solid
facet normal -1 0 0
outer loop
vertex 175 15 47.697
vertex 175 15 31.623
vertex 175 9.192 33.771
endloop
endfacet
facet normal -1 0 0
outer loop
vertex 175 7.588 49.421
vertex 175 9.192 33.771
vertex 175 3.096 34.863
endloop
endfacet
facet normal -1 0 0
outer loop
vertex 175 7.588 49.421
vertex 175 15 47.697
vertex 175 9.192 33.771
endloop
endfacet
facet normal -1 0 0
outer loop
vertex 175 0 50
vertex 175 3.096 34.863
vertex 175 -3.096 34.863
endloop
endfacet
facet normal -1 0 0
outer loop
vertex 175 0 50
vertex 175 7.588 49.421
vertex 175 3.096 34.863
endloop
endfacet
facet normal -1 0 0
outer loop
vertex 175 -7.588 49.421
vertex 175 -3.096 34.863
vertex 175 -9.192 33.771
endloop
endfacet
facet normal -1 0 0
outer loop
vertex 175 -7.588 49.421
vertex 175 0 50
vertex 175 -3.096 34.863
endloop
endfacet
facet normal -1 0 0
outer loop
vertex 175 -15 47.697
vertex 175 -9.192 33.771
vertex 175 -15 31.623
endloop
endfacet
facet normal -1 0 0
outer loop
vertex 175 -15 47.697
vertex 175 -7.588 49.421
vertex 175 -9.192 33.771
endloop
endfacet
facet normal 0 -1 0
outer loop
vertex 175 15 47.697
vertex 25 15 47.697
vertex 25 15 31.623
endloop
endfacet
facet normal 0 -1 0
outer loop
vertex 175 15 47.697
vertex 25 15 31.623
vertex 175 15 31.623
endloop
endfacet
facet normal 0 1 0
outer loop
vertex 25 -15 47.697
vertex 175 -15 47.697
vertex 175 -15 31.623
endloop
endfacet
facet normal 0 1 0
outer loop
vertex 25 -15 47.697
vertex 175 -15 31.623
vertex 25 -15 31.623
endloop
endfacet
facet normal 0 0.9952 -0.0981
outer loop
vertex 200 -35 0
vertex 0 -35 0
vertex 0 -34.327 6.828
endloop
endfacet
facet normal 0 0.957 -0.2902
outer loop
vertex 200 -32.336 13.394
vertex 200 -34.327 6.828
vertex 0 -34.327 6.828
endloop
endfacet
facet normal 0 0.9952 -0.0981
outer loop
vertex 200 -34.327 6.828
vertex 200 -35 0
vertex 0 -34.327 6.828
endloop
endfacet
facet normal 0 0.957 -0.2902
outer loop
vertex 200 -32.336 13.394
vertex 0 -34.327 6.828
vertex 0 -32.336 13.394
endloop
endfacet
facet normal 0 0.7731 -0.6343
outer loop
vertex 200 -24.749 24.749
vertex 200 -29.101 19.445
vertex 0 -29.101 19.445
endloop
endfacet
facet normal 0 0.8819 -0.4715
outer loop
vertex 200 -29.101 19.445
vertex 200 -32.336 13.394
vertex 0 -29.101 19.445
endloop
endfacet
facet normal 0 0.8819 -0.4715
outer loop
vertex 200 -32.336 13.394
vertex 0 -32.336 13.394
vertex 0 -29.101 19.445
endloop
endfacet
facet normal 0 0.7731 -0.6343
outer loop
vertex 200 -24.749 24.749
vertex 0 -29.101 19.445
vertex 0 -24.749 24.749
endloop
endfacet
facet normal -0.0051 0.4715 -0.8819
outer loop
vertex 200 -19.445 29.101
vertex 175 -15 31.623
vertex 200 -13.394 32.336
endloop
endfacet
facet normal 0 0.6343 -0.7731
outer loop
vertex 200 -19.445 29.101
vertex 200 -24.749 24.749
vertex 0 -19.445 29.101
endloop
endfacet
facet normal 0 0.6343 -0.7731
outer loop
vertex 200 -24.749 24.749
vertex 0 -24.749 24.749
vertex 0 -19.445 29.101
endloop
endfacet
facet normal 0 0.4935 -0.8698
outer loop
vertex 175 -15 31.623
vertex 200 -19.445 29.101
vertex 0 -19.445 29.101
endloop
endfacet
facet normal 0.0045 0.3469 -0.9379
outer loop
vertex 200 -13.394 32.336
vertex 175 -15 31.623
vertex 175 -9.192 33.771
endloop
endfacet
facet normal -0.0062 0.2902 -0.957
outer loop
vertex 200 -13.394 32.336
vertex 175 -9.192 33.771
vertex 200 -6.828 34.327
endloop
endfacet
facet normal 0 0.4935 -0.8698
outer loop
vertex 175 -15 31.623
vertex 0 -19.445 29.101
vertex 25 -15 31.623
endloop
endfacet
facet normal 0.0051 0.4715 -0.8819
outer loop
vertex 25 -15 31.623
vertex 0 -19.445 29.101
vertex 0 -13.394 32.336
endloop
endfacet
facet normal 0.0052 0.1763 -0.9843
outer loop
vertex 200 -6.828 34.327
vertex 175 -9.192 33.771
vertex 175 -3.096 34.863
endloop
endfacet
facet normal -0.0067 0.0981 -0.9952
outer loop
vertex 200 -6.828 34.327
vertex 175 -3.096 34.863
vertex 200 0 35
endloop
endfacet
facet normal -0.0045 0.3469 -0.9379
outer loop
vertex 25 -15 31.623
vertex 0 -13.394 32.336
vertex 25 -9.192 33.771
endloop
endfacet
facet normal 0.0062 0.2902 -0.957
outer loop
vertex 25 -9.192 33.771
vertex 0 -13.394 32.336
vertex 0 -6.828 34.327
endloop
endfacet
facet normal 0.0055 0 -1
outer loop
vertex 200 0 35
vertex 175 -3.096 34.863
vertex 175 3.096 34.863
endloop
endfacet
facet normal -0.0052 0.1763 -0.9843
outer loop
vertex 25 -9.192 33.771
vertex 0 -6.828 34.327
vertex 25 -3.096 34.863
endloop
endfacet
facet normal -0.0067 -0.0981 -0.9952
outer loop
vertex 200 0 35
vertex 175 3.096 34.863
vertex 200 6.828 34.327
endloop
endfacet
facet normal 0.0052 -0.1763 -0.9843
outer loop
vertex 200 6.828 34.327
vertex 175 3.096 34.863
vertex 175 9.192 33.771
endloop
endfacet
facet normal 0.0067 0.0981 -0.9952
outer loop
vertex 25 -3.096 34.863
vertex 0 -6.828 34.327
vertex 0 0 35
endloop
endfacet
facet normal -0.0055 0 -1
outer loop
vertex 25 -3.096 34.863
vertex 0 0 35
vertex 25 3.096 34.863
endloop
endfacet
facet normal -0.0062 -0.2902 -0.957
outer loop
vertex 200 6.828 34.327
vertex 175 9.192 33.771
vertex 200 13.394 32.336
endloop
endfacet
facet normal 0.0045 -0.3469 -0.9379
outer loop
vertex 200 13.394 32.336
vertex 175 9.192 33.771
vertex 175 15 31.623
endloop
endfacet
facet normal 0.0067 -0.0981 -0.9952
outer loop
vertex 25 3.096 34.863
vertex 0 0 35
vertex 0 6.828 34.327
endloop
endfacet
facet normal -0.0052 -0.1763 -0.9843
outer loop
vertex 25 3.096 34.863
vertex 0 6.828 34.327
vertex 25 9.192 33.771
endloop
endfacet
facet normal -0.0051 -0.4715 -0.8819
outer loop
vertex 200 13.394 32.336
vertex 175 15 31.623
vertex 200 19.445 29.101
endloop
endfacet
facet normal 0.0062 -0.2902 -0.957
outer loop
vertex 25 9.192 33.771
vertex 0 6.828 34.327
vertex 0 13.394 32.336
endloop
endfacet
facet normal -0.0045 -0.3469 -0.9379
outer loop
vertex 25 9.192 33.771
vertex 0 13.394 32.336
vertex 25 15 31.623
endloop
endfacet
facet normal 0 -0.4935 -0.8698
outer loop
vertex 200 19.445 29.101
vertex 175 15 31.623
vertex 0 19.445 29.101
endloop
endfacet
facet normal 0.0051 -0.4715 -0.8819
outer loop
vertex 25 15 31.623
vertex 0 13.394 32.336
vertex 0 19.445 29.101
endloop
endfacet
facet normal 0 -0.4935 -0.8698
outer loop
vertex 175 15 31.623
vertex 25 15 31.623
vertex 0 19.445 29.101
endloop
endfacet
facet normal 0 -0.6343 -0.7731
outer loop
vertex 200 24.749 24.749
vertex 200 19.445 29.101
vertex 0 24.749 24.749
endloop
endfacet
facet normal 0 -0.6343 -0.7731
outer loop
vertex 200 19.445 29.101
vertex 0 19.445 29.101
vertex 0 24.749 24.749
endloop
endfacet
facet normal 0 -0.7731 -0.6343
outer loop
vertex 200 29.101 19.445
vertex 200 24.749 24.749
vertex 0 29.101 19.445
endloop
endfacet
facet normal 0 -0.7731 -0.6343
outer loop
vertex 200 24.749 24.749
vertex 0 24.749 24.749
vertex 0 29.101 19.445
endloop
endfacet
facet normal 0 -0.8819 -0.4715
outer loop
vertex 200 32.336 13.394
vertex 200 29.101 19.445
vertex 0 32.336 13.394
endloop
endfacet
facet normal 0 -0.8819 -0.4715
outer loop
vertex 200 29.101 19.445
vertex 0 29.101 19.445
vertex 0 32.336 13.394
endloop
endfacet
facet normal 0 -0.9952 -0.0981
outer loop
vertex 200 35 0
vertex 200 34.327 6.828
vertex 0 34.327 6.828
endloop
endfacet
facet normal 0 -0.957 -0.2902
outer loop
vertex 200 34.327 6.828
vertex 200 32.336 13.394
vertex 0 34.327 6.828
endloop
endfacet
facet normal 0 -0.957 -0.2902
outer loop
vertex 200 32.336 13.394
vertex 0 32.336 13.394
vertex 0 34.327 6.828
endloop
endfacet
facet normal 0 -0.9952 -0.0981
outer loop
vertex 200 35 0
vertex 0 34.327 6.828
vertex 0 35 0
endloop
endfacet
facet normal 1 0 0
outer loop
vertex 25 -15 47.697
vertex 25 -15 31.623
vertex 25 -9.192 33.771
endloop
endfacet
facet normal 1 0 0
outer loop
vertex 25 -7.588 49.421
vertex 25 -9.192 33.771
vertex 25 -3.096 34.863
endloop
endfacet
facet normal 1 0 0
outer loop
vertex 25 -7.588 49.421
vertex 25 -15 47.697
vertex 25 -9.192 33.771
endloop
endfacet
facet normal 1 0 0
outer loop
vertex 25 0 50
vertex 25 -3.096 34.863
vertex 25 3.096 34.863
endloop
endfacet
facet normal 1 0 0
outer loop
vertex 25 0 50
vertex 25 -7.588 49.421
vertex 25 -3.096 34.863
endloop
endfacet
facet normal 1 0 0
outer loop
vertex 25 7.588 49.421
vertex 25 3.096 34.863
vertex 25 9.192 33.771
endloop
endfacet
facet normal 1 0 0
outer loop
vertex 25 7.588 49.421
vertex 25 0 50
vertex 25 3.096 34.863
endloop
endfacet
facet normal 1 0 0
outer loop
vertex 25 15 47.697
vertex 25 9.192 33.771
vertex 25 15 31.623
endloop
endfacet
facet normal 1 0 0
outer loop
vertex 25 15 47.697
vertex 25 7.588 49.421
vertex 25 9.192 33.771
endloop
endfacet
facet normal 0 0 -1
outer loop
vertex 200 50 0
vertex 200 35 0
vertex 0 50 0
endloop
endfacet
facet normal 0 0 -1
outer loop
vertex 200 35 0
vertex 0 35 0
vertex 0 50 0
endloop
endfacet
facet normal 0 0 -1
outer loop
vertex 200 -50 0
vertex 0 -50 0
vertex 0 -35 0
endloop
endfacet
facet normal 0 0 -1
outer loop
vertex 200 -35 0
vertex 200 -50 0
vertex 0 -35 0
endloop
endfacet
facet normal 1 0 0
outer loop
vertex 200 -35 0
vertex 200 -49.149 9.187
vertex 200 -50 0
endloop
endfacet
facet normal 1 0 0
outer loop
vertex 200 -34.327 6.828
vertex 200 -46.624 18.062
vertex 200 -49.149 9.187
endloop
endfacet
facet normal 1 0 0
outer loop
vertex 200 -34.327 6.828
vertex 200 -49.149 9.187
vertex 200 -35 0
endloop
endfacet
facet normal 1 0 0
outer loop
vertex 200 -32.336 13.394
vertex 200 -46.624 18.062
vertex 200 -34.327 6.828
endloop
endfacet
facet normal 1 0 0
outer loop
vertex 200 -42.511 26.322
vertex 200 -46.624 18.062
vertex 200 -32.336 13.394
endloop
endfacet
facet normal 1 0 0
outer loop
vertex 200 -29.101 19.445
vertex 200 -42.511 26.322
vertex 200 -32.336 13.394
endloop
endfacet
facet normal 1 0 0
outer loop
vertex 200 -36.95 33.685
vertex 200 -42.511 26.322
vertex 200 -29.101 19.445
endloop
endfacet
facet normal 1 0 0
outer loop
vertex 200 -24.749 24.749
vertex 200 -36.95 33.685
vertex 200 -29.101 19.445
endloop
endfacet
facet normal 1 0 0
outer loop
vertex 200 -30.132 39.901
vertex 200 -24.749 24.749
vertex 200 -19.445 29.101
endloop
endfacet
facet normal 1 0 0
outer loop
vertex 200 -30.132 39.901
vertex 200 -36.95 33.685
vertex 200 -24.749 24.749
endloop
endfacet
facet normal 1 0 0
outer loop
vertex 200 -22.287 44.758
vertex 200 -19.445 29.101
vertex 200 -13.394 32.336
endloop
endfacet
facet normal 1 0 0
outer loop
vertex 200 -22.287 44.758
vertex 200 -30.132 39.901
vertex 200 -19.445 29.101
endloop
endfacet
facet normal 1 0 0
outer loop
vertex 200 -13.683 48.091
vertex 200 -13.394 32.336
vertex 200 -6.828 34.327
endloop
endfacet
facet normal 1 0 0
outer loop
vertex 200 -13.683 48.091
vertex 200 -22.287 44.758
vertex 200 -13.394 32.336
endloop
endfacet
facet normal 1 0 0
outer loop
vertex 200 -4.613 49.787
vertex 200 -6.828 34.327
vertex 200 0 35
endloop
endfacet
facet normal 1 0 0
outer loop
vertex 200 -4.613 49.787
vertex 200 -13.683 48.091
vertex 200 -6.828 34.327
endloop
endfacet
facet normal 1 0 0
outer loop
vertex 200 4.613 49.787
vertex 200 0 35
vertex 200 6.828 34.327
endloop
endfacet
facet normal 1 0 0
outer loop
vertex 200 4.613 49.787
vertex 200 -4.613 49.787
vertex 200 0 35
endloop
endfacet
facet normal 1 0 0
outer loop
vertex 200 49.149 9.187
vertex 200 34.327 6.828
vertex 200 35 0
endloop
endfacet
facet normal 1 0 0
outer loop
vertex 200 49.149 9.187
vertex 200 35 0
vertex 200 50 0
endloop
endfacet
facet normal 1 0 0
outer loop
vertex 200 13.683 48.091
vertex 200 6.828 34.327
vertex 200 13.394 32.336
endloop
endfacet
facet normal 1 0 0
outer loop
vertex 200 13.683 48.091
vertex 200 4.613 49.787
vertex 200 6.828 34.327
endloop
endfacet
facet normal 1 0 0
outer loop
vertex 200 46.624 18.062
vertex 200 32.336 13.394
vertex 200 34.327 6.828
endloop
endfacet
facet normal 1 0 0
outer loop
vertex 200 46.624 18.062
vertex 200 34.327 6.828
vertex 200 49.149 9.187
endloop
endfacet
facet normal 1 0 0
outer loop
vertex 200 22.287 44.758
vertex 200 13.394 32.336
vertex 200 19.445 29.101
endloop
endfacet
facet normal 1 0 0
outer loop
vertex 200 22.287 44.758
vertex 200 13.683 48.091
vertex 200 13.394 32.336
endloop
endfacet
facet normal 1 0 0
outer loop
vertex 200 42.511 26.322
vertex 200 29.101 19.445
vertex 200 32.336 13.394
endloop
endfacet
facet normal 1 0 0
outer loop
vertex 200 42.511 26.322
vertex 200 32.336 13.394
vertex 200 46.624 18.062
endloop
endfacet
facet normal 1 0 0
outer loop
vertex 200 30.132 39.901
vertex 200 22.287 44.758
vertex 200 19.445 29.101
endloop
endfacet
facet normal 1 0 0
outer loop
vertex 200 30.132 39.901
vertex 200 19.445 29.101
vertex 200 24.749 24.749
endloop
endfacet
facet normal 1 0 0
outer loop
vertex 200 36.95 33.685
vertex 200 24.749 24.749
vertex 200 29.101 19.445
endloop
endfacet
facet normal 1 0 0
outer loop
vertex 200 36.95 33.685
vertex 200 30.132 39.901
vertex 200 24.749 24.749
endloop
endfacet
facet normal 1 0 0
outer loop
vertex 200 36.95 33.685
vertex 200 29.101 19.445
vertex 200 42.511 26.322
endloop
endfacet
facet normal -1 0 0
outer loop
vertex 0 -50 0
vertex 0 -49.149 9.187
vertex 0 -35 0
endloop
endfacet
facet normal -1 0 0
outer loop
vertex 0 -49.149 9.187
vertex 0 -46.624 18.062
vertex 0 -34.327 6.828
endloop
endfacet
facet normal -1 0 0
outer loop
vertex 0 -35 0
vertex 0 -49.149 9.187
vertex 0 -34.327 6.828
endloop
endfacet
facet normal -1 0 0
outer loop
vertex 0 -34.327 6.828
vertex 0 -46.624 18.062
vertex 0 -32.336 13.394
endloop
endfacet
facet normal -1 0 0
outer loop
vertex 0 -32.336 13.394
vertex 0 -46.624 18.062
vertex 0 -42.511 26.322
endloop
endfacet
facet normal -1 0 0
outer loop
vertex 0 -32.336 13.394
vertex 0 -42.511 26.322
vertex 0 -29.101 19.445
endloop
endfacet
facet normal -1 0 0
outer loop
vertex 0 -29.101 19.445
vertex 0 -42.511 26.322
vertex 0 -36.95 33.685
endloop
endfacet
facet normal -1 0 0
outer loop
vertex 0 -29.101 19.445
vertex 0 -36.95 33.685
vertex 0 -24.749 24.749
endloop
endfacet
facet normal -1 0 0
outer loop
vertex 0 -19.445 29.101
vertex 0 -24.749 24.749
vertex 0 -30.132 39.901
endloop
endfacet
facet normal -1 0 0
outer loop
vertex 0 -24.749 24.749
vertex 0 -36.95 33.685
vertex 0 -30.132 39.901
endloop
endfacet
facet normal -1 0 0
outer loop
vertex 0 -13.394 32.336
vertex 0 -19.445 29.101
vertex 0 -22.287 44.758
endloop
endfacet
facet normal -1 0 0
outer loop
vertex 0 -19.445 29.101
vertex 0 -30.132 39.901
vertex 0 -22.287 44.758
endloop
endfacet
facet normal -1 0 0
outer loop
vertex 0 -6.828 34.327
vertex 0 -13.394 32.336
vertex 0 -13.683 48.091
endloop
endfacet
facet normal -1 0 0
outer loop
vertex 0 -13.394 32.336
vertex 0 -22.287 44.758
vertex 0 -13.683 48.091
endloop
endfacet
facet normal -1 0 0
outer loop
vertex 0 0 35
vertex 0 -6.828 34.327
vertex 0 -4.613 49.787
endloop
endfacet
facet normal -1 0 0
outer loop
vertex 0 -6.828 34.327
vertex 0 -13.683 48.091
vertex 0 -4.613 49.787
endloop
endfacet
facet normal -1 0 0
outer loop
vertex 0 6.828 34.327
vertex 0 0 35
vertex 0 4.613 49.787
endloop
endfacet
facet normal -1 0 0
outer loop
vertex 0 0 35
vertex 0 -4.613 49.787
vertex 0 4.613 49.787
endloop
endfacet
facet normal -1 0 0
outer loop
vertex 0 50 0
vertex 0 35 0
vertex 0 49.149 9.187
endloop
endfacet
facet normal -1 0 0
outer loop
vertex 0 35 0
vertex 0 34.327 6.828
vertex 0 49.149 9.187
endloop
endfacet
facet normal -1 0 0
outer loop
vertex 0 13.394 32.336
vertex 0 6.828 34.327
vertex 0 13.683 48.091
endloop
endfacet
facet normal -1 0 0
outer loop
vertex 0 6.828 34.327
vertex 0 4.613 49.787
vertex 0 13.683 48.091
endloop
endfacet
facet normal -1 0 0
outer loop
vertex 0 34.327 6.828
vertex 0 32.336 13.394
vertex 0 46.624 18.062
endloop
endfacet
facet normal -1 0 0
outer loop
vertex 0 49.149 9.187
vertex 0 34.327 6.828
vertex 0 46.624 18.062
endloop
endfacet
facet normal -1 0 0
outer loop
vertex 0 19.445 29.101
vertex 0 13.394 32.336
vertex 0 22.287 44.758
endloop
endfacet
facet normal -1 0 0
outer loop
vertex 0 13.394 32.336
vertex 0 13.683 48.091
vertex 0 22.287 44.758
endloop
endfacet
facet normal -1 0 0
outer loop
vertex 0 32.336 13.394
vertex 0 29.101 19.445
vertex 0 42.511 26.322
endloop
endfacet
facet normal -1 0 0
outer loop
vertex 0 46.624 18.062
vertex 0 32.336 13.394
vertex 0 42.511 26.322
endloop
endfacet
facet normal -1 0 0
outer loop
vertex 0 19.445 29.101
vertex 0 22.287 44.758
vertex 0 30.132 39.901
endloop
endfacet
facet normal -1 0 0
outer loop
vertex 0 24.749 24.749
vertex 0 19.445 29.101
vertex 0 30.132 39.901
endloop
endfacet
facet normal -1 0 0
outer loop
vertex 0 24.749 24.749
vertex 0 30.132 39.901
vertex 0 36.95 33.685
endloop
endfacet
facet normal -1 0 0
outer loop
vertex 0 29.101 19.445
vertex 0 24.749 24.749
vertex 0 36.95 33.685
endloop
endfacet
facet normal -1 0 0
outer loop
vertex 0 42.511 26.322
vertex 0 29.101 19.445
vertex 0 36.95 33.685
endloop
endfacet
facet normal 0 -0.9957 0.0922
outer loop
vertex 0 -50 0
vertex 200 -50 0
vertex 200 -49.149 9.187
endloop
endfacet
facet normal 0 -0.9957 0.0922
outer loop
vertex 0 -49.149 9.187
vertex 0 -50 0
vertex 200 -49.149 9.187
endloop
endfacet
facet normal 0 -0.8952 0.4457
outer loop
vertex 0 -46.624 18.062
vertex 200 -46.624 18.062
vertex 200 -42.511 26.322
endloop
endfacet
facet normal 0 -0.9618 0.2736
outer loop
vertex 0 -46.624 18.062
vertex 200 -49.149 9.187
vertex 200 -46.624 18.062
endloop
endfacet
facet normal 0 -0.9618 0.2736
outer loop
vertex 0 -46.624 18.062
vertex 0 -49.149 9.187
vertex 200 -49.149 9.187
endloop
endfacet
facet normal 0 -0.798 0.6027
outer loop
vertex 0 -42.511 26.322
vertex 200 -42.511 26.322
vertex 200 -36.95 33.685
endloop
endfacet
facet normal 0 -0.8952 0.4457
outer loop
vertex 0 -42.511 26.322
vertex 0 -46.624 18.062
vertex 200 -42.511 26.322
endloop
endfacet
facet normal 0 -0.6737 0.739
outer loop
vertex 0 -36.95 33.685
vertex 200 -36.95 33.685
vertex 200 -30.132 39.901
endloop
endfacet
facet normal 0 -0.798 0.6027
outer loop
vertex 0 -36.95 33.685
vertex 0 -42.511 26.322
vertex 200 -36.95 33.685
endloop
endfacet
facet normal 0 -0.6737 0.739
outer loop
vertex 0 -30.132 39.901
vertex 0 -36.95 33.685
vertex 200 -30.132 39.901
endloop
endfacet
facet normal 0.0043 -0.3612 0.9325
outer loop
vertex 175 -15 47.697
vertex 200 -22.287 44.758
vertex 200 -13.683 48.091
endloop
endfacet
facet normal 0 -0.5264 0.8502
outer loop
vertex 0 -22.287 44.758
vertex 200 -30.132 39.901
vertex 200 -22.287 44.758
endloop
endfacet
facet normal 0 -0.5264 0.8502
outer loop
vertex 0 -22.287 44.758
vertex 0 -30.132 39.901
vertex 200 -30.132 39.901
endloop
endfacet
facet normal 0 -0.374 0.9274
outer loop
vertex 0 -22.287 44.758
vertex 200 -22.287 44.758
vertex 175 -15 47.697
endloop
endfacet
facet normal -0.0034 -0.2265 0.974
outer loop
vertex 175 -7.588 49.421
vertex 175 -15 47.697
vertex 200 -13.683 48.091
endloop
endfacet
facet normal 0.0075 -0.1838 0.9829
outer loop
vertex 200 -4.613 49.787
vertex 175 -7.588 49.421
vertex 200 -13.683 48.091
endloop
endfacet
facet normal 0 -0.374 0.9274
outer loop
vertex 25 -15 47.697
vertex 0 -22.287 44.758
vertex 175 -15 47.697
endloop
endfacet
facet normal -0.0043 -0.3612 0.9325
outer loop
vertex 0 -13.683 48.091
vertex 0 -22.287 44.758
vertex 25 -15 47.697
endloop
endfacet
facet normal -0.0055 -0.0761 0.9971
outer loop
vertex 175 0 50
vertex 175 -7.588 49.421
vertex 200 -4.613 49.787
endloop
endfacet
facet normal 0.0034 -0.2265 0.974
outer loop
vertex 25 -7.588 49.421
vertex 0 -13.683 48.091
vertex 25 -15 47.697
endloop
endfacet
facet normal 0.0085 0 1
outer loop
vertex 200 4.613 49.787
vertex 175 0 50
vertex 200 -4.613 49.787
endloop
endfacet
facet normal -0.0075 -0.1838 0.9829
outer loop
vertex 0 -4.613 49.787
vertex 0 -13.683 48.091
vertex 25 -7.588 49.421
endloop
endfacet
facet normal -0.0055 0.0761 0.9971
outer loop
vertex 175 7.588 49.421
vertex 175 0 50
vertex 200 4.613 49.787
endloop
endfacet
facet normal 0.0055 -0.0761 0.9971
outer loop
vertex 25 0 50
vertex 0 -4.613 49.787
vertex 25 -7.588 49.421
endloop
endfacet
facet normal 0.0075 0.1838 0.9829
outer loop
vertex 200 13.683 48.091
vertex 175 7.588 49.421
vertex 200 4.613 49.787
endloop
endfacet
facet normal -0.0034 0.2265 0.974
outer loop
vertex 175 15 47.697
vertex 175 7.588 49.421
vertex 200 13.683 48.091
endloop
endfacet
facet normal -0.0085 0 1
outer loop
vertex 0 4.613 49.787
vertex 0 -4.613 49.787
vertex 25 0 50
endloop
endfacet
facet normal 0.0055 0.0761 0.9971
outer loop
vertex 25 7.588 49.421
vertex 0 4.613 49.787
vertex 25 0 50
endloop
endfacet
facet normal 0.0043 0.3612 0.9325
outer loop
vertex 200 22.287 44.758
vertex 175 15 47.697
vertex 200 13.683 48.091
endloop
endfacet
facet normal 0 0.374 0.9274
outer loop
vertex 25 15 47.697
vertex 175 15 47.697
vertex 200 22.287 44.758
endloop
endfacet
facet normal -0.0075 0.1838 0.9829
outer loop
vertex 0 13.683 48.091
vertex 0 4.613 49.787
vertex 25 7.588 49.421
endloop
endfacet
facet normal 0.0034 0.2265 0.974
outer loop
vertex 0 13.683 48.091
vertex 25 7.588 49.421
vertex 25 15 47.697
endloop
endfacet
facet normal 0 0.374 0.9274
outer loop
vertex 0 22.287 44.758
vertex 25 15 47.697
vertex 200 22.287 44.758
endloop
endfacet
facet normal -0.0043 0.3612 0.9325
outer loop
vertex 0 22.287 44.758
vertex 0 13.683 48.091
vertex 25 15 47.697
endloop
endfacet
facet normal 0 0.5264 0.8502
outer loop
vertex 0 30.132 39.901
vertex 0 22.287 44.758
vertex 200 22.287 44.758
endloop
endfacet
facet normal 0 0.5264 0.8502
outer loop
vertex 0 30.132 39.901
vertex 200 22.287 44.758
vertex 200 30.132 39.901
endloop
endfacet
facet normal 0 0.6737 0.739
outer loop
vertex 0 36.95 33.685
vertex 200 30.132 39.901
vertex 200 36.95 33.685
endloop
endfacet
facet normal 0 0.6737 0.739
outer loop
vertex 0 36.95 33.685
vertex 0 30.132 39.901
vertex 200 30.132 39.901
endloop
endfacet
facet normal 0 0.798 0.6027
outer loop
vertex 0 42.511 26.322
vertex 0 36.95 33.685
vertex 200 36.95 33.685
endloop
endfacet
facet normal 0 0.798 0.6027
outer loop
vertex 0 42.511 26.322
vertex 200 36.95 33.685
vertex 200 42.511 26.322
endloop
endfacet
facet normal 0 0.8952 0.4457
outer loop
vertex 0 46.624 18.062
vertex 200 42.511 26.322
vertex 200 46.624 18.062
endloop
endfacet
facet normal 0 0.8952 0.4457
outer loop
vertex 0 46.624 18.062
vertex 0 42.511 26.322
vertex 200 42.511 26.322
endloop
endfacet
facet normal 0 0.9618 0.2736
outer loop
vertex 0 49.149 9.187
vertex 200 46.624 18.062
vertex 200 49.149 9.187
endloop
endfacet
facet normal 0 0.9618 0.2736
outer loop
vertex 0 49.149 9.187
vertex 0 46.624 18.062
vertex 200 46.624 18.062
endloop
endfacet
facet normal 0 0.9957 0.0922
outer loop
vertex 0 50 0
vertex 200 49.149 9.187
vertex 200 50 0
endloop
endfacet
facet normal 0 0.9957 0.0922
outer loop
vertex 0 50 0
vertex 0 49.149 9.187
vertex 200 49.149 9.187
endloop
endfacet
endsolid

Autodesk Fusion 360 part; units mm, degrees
sketch "Boceto1" plane through (0, 0, 0) normal (1, 0, 0) x (0, 1, 0)
sketch "Boceto2" plane through (0, 0, 0) normal (1, 0, 0) x (0, 1, 0)
  line L0 (-50, 0) -> (-35, 0)
  line L1 (35, 0) -> (50, 0)
  arc A0 (50, 0) -> (-50, 0) centre (0, 0) ccw
  arc A1 (35, 0) -> (-35, 0) centre (0, 0) ccw
  dimension "d1" = 100
  dimension "d2" = 15
extrude "Extruir1" add sketch "Boceto2" along normal blind 200
ref_plane "PlanoDeObra1" through (100, 0, 50) normal (0, 0, 1) x (0, -1, 0)
sketch "Boceto3" plane through (100, 0, 50) normal (0, 0, 1) x (1, 0, 0)
  line L0 (75, -15) -> (-75, -15)
  line L1 (-75, -15) -> (-75, 15)
  line L2 (-75, 15) -> (75, 15)
  line L3 (75, 15) -> (75, -15)
  line L4 (75, -15) -> (-75, 15) construction
  line L5 (-75, -15) -> (75, 15) construction
  dimension "d6" = 150
  dimension "d7" = 30
extrude "Extruir2" cut sketch "Boceto3" along normal up to surface end surface at (66.6667, -26.8116, 22.4976)
sketch "Boceto4" plane through (0, 0, 0) normal (0, 0, 1) x (1, 0, 0)
